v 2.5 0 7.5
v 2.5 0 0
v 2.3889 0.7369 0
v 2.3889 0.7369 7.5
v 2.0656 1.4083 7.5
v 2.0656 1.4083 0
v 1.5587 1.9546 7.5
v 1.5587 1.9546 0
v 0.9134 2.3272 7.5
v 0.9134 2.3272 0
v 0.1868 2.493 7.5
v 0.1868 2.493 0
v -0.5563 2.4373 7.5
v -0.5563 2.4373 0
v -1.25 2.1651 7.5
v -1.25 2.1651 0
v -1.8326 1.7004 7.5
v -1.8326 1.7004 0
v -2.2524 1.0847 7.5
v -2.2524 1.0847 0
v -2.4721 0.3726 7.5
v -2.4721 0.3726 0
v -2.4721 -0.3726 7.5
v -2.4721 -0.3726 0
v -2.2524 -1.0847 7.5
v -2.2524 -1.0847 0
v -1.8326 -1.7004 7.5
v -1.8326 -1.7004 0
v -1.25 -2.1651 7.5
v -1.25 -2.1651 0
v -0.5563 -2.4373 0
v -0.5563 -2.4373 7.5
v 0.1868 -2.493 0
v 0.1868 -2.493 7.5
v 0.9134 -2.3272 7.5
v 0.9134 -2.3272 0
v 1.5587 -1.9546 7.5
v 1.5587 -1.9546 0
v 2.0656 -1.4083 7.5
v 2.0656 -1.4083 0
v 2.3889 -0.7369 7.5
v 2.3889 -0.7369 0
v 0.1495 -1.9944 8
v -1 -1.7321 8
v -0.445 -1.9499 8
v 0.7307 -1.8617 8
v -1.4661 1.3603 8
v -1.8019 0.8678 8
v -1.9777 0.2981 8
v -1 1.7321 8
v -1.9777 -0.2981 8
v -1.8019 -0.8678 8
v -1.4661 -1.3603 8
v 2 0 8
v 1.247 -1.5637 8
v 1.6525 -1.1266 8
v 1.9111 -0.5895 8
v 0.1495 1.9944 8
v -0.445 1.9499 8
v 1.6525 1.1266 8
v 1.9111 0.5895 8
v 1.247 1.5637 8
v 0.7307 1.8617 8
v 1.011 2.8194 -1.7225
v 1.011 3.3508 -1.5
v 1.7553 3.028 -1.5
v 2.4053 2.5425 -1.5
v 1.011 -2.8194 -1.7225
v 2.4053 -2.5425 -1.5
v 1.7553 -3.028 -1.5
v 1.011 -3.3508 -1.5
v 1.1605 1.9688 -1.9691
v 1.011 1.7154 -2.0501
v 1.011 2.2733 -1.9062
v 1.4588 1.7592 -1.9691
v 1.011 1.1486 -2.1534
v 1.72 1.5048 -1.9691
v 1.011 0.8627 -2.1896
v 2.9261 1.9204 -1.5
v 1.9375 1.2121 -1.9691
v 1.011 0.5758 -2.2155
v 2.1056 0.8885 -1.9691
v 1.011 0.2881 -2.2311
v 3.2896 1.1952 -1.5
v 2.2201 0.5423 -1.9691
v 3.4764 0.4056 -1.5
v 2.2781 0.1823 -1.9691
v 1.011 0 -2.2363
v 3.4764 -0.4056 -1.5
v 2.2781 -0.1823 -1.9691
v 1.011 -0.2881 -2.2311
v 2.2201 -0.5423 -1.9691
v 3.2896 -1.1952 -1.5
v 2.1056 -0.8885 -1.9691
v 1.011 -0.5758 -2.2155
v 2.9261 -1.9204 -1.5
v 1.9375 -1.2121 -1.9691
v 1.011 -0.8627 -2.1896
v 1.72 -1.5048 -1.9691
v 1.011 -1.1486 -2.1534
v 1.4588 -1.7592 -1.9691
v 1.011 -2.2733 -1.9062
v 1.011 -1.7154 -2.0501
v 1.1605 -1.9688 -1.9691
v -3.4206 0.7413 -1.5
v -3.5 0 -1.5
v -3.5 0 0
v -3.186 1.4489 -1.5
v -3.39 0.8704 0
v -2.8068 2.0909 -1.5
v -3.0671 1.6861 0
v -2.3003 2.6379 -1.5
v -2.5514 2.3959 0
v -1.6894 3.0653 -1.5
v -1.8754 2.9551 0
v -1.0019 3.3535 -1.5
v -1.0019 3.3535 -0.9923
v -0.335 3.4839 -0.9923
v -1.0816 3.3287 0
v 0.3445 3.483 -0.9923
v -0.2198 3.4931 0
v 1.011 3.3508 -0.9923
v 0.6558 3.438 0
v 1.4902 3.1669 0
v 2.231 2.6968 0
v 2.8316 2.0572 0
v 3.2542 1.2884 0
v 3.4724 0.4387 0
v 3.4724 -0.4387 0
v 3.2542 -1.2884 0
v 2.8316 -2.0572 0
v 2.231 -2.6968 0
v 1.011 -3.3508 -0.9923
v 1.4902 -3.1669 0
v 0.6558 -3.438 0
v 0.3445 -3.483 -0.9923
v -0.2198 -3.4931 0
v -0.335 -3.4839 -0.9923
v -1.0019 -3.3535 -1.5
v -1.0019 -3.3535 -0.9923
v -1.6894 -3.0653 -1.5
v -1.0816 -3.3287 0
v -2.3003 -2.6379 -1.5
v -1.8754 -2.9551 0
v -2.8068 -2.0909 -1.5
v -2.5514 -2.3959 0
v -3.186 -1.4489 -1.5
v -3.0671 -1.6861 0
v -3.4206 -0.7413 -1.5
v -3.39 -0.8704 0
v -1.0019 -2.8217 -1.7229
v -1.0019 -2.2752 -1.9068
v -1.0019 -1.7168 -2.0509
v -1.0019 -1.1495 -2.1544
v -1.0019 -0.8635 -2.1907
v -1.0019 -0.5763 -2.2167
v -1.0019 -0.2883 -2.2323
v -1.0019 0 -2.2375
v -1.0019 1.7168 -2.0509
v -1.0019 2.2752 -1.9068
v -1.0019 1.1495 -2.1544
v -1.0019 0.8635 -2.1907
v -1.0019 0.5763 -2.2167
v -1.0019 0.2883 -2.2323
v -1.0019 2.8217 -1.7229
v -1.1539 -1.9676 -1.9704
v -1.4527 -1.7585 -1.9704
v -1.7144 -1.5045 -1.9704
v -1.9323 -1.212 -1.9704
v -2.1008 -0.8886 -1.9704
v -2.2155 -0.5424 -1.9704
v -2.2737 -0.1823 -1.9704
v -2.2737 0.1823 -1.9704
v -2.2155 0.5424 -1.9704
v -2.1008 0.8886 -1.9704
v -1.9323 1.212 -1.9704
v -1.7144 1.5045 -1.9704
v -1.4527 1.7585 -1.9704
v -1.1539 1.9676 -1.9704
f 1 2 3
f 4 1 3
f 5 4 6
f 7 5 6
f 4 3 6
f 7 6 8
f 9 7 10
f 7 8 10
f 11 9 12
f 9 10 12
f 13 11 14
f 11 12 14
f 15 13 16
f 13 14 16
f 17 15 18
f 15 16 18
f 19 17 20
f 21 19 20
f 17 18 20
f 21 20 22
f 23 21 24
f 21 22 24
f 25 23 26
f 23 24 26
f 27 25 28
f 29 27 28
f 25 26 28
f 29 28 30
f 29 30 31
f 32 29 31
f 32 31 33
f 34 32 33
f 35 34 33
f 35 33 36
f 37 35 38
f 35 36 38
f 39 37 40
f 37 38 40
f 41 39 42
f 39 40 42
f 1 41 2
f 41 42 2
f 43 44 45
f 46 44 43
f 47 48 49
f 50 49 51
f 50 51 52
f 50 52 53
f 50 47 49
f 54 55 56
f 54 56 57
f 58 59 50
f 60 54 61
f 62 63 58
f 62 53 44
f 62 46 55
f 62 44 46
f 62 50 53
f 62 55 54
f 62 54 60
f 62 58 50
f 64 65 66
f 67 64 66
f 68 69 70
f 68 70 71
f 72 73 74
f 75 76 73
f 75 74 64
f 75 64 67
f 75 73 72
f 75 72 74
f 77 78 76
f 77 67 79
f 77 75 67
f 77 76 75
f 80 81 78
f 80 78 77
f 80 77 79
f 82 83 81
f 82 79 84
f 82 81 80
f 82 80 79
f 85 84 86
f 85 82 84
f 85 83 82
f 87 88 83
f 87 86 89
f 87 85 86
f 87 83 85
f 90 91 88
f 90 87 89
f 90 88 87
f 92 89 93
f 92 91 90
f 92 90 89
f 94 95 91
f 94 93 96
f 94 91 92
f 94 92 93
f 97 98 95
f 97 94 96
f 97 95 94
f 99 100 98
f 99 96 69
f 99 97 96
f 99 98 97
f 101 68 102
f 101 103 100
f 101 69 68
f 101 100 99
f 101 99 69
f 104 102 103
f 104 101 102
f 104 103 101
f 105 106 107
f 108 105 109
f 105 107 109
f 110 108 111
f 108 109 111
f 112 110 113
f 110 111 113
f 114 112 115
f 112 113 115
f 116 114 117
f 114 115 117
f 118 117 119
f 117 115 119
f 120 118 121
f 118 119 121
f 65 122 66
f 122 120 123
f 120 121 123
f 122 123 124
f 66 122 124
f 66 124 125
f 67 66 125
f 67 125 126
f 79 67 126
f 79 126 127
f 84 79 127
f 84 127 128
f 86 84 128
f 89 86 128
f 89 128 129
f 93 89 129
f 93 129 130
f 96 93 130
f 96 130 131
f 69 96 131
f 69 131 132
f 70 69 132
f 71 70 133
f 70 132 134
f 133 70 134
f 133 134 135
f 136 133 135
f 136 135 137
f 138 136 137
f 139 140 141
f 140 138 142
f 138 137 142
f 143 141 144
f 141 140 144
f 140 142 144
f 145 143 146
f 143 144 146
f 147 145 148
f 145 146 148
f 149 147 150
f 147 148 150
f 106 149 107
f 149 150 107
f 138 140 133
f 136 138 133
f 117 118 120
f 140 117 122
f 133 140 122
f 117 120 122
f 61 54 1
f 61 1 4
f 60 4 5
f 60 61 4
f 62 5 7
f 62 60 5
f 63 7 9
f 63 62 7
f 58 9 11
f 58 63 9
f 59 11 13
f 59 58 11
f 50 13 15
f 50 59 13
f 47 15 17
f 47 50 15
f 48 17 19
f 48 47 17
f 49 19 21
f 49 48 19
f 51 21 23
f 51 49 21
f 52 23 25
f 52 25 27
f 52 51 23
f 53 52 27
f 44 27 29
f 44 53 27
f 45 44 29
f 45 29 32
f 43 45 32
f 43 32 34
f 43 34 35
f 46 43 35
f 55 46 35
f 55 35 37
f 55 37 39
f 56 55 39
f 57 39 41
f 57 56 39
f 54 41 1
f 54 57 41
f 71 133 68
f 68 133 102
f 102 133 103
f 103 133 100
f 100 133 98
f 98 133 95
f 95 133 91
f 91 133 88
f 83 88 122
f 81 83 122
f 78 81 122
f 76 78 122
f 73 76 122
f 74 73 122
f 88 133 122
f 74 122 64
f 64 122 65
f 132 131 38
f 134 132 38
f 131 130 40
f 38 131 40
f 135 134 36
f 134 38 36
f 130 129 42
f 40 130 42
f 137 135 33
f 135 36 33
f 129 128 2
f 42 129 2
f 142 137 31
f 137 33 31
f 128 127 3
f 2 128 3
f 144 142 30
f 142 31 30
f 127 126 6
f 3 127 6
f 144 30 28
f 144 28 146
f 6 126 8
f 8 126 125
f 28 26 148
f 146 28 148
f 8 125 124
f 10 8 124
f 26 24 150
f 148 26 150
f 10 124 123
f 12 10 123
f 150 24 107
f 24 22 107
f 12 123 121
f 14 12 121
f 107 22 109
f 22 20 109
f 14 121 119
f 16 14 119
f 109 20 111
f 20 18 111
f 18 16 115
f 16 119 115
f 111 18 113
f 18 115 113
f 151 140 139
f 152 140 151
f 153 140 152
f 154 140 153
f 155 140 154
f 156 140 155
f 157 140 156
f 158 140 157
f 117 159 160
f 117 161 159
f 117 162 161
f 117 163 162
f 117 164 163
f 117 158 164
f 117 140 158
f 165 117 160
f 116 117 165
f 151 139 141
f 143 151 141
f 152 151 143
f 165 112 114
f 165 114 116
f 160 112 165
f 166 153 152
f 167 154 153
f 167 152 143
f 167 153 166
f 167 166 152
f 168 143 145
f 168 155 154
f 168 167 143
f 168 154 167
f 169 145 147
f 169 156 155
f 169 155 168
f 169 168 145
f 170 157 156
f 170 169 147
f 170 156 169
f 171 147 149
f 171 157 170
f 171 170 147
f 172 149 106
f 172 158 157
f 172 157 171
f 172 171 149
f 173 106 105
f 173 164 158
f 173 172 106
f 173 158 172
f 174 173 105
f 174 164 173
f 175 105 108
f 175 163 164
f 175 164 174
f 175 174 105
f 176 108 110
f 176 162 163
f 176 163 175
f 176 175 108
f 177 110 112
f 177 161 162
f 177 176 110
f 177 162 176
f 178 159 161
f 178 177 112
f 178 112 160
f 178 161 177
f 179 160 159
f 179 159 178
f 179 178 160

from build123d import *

# Parameters (mm, degrees)
SKETCH_1_R          = 2.5
EXTRUDE_1_DEPTH     = 8
CHAMFER_2_SIZE      = 0.5
SKETCH_2_R          = 3.5
EXTRUDE_2_DEPTH     = 1.5
DOME_1_FACE_RADIUS  = 3.5
DOME_1_HEIGHT       = 0.8
SKETCH_3_W          = 2.012887991
SKETCH_3_H          = 3.133753739
CUT_EXTRUDE_1_DEPTH = 5


with BuildPart() as part:
    # 草图1 → 凸台-拉伸1 (new body)
    with BuildSketch(Plane.XY):
        Circle(SKETCH_1_R)
    extrude(amount=EXTRUDE_1_DEPTH)

    # 倒角2
    chamfer_2_edges = [part.edges().sort_by_distance(p)[0] for p in [
        (-2.5, 0, 8),
    ]]
    chamfer(chamfer_2_edges, length=CHAMFER_2_SIZE)

    # 草图2 → 凸台-拉伸2 (add)
    with BuildSketch(Plane(origin=(0, 0, 0), x_dir=(-1, 0, 0), z_dir=(0, 0, -1))):
        Circle(SKETCH_2_R)
    extrude(amount=EXTRUDE_2_DEPTH)

    # 圆顶1: a dome of height H over a round flat face of radius A is a cap of a sphere of radius (A * A + H * H) / (2 * H)
    dome_1_r = (DOME_1_FACE_RADIUS * DOME_1_FACE_RADIUS + DOME_1_HEIGHT * DOME_1_HEIGHT) / (2 * DOME_1_HEIGHT)
    dome_1_base = Plane((0, 0, -1.5), z_dir=(0, 0, -1))
    with Locations(dome_1_base.offset(DOME_1_HEIGHT - dome_1_r)):
        dome_1_ball = Sphere(dome_1_r, mode=Mode.PRIVATE)
    add(split(dome_1_ball, bisect_by=dome_1_base, keep=Keep.TOP, mode=Mode.PRIVATE))

    # 草图3 → 切除-拉伸1 (cut, symmetric)
    with BuildSketch(Plane(origin=(0, 0, 0), x_dir=(1, 0, 0), z_dir=(0, 1, 0))):
        with Locations((0.004540496, 2.559156118)):
            Rectangle(SKETCH_3_W, SKETCH_3_H)
    extrude(amount=CUT_EXTRUDE_1_DEPTH, both=True, mode=Mode.SUBTRACT)


solid = part.part
